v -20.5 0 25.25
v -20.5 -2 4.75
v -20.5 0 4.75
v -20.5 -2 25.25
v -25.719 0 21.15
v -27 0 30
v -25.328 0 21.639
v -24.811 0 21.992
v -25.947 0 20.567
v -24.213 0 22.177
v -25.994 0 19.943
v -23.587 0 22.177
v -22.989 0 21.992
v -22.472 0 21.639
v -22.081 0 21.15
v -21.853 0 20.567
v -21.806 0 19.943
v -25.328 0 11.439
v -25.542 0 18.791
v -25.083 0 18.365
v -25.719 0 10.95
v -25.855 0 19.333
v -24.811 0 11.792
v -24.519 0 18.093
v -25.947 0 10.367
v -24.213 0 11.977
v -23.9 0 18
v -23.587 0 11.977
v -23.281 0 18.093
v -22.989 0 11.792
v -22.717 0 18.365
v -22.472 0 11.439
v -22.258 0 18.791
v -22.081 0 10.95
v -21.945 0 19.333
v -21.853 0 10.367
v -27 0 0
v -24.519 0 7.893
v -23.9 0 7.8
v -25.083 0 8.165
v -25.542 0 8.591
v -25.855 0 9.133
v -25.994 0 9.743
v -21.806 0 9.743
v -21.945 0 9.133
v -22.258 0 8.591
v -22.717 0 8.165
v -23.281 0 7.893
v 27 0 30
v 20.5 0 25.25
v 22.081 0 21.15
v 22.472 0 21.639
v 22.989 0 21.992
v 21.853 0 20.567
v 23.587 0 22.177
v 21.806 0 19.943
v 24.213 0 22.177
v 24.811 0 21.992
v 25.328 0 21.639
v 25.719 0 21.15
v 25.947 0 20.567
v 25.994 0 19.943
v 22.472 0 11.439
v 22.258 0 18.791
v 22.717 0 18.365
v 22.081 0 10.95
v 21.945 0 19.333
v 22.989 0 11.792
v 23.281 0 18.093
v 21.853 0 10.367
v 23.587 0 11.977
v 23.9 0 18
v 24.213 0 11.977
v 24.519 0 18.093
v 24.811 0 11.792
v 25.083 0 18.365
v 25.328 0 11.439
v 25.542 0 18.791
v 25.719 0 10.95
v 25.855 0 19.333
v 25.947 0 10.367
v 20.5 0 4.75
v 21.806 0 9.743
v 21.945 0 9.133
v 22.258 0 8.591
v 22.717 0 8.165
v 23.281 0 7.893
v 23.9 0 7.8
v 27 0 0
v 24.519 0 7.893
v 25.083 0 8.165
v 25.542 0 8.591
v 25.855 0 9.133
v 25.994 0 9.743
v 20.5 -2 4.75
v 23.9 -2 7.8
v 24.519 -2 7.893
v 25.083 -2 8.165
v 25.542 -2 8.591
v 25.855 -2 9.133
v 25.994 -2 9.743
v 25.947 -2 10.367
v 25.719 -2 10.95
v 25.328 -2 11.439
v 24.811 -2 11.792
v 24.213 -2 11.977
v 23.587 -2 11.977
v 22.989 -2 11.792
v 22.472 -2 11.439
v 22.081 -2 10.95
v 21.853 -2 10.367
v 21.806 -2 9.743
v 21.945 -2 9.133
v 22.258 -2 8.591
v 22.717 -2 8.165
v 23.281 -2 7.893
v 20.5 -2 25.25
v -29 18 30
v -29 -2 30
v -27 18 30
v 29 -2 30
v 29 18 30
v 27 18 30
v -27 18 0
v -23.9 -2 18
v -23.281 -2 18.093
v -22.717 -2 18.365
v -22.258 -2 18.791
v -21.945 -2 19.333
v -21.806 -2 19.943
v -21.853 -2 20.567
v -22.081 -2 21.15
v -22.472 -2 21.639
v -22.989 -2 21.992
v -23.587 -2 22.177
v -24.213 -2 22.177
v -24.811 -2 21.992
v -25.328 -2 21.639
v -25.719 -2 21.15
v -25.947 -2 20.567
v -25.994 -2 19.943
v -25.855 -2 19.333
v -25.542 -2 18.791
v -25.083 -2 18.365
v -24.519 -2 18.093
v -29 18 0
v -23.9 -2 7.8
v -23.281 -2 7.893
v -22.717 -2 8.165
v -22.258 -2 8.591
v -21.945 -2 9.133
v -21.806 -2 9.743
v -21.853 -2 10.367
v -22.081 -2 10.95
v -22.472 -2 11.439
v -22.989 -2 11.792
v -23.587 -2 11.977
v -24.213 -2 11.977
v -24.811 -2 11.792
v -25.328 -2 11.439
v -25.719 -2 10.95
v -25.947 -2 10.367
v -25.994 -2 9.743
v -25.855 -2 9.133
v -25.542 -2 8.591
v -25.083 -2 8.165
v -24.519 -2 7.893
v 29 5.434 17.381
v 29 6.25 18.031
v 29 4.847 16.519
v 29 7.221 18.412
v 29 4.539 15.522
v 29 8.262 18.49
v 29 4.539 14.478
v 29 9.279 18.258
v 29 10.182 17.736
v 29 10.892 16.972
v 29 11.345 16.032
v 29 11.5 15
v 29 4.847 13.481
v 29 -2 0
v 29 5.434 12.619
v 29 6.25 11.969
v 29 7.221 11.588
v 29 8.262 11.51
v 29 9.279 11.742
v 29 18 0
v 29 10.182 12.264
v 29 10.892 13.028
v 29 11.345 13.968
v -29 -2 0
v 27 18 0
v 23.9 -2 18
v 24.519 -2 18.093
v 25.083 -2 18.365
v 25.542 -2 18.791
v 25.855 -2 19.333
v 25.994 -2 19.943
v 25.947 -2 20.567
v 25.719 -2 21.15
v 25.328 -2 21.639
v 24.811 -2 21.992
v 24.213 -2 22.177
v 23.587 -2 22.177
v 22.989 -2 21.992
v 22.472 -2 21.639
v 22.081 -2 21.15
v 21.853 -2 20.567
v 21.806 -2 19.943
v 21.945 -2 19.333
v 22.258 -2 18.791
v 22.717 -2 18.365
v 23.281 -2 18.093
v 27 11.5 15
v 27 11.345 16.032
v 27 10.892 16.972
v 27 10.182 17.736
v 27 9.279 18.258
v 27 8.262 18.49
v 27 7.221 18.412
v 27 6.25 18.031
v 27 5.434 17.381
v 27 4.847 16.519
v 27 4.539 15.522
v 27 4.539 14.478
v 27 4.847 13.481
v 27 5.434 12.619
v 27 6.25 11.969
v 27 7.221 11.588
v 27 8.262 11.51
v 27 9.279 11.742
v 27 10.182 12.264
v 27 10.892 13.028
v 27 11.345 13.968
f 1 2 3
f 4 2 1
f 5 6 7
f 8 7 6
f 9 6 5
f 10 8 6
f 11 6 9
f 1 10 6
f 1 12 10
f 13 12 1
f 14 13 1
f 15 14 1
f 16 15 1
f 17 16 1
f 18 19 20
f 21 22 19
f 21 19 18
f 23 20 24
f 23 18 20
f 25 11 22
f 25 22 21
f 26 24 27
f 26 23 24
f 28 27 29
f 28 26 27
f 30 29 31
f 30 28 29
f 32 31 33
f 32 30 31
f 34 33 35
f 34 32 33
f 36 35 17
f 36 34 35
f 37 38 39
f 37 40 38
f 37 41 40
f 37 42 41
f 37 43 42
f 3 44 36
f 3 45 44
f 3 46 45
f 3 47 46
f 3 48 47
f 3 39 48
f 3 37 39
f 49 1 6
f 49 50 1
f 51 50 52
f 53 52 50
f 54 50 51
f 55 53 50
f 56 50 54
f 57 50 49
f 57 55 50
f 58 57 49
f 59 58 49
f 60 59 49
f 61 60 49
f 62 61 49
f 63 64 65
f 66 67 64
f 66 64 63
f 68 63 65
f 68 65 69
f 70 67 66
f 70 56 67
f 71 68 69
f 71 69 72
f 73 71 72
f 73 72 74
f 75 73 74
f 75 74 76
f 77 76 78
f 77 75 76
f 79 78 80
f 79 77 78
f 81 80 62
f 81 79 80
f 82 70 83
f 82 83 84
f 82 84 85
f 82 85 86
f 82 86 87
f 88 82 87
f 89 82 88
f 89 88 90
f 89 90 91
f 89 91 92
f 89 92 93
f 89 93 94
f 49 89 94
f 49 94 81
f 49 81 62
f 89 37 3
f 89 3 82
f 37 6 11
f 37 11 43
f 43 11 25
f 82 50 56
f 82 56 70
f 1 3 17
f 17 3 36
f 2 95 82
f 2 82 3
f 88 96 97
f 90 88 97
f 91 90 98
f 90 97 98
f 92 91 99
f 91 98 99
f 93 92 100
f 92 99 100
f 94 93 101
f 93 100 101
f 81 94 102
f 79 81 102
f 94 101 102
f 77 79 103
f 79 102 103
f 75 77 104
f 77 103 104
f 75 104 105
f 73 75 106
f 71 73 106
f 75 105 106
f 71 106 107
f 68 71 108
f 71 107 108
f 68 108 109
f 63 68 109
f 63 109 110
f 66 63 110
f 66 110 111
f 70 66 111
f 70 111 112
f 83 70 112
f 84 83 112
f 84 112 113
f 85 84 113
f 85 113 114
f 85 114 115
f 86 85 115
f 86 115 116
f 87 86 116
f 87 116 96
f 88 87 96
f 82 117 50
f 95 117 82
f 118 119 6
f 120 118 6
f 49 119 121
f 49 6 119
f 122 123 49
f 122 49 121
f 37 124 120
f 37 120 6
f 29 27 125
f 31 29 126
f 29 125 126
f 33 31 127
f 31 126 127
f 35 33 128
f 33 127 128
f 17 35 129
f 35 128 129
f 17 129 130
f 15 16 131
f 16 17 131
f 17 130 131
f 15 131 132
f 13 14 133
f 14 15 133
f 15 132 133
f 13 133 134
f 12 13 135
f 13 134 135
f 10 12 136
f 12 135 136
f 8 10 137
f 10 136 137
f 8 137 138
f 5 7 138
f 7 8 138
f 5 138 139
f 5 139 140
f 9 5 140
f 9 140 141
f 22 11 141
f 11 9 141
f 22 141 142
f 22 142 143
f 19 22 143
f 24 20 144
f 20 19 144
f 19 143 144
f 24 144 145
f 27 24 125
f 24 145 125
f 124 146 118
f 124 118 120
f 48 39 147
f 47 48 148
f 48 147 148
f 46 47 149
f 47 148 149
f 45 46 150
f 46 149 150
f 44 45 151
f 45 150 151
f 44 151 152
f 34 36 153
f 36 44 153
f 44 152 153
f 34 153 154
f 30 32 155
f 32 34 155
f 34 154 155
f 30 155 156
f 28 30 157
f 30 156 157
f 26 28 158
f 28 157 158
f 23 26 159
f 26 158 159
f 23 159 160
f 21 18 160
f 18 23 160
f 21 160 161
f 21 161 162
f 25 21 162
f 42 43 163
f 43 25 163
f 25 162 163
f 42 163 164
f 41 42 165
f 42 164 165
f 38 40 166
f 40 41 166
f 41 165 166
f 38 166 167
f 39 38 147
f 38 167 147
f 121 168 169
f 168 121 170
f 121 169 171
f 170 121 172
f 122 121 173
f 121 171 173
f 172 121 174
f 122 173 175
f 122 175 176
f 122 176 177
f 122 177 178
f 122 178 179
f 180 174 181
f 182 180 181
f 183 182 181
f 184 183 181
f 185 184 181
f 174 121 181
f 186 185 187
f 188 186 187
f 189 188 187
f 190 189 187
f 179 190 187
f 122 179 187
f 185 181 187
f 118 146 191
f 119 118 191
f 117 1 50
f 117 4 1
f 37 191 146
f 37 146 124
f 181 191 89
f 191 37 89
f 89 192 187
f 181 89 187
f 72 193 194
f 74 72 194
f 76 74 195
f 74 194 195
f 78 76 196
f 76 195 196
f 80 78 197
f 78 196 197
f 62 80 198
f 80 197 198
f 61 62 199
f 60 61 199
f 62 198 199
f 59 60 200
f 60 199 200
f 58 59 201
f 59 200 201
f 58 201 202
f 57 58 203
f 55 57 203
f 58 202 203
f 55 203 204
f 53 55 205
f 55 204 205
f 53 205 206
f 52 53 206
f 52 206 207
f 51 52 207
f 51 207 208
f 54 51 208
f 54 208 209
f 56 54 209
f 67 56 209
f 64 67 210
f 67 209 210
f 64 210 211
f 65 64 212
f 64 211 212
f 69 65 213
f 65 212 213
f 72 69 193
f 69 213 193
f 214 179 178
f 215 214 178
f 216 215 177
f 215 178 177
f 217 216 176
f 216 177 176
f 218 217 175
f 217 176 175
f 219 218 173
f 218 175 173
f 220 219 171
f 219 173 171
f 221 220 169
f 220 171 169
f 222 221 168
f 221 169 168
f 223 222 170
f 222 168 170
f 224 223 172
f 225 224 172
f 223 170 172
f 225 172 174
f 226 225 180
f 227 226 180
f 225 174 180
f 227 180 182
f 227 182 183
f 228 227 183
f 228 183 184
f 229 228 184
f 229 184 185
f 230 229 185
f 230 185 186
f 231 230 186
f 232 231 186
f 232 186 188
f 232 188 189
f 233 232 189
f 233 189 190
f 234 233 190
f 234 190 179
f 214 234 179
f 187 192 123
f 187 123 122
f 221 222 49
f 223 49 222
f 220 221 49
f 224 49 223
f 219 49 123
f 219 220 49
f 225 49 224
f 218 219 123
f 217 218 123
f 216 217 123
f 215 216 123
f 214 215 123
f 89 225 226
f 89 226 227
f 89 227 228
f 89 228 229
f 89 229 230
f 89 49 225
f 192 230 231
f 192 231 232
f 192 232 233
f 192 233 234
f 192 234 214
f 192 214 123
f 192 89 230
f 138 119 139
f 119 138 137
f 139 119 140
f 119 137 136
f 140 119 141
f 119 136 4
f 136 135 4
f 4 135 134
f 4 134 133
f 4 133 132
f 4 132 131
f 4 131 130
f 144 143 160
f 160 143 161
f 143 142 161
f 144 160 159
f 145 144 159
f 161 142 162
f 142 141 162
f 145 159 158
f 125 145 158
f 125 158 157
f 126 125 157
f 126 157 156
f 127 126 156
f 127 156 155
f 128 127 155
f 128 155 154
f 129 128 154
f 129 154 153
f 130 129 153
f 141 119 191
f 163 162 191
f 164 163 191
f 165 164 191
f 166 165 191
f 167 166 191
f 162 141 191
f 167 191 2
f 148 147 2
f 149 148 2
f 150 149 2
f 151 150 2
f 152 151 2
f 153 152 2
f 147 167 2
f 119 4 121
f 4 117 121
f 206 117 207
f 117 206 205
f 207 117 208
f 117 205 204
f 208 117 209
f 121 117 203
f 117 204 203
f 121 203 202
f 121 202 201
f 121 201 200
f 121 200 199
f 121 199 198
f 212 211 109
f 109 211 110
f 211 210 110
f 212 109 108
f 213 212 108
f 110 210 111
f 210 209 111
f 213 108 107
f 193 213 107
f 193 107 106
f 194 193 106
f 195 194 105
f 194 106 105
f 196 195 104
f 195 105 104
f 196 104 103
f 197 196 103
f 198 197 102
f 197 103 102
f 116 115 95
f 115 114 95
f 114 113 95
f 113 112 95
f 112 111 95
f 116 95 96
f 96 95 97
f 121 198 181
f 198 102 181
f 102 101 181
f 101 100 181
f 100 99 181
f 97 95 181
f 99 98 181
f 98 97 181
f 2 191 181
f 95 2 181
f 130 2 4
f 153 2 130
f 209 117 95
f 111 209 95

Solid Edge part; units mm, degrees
sketch "Sketch1" plane through (0, 0, 0) normal (0, 0, 1) x (1, 0, 0)
  line L0 (29, -2) -> (29, 18)
  line L1 (27, 18) -> (29, 18)
  line L2 (27, 0) -> (27, 18)
  line L3 (0, 0) -> (27, 0)
  line L4 (0, -2) -> (0, 0)
  line L5 (0, -2) -> (29, -2)
extrude "Protrusion1" add sketch "Sketch1" along normal blind 30
hole "Hole1" at (23.9, -2, 20.1) direction (0, 1, 0) diameter 4.2 end up to next
hole "Hole2" at (23.9, -2, 9.9) direction (0, 1, 0) diameter 4.2 end up to next
sketch "Sketch2" plane through (14.5, -2, 12.5) normal (0, -1, 0) x (1, 0, 0)
  line L0 (-14.5, 12.75) -> (6, 12.75)
  line L1 (6, 12.75) -> (6, -7.75)
  line L2 (6, -7.75) -> (-14.5, -7.75)
  line L3 (-14.5, -7.75) -> (-14.5, 12.75)
  dimension "D1" = 20.5
  dimension "D2" = 20.5
extrude "Cutout1" cut sketch "Sketch2" against normal up to next
sketch "Sketch3" plane through (29, 8, 15) normal (1, 0, 0) x (0, 1, 0)
  circle A0 centre (0, 0) radius 3.5
  dimension "D1" = 7
extrude "Cutout2" cut sketch "Sketch3" against normal up to next
mirror "Mirror1" about plane through (0, -1, 23.875) normal (-1, 0, 0) of "Protrusion1", "Cutout1", "Hole1", "Hole2"
